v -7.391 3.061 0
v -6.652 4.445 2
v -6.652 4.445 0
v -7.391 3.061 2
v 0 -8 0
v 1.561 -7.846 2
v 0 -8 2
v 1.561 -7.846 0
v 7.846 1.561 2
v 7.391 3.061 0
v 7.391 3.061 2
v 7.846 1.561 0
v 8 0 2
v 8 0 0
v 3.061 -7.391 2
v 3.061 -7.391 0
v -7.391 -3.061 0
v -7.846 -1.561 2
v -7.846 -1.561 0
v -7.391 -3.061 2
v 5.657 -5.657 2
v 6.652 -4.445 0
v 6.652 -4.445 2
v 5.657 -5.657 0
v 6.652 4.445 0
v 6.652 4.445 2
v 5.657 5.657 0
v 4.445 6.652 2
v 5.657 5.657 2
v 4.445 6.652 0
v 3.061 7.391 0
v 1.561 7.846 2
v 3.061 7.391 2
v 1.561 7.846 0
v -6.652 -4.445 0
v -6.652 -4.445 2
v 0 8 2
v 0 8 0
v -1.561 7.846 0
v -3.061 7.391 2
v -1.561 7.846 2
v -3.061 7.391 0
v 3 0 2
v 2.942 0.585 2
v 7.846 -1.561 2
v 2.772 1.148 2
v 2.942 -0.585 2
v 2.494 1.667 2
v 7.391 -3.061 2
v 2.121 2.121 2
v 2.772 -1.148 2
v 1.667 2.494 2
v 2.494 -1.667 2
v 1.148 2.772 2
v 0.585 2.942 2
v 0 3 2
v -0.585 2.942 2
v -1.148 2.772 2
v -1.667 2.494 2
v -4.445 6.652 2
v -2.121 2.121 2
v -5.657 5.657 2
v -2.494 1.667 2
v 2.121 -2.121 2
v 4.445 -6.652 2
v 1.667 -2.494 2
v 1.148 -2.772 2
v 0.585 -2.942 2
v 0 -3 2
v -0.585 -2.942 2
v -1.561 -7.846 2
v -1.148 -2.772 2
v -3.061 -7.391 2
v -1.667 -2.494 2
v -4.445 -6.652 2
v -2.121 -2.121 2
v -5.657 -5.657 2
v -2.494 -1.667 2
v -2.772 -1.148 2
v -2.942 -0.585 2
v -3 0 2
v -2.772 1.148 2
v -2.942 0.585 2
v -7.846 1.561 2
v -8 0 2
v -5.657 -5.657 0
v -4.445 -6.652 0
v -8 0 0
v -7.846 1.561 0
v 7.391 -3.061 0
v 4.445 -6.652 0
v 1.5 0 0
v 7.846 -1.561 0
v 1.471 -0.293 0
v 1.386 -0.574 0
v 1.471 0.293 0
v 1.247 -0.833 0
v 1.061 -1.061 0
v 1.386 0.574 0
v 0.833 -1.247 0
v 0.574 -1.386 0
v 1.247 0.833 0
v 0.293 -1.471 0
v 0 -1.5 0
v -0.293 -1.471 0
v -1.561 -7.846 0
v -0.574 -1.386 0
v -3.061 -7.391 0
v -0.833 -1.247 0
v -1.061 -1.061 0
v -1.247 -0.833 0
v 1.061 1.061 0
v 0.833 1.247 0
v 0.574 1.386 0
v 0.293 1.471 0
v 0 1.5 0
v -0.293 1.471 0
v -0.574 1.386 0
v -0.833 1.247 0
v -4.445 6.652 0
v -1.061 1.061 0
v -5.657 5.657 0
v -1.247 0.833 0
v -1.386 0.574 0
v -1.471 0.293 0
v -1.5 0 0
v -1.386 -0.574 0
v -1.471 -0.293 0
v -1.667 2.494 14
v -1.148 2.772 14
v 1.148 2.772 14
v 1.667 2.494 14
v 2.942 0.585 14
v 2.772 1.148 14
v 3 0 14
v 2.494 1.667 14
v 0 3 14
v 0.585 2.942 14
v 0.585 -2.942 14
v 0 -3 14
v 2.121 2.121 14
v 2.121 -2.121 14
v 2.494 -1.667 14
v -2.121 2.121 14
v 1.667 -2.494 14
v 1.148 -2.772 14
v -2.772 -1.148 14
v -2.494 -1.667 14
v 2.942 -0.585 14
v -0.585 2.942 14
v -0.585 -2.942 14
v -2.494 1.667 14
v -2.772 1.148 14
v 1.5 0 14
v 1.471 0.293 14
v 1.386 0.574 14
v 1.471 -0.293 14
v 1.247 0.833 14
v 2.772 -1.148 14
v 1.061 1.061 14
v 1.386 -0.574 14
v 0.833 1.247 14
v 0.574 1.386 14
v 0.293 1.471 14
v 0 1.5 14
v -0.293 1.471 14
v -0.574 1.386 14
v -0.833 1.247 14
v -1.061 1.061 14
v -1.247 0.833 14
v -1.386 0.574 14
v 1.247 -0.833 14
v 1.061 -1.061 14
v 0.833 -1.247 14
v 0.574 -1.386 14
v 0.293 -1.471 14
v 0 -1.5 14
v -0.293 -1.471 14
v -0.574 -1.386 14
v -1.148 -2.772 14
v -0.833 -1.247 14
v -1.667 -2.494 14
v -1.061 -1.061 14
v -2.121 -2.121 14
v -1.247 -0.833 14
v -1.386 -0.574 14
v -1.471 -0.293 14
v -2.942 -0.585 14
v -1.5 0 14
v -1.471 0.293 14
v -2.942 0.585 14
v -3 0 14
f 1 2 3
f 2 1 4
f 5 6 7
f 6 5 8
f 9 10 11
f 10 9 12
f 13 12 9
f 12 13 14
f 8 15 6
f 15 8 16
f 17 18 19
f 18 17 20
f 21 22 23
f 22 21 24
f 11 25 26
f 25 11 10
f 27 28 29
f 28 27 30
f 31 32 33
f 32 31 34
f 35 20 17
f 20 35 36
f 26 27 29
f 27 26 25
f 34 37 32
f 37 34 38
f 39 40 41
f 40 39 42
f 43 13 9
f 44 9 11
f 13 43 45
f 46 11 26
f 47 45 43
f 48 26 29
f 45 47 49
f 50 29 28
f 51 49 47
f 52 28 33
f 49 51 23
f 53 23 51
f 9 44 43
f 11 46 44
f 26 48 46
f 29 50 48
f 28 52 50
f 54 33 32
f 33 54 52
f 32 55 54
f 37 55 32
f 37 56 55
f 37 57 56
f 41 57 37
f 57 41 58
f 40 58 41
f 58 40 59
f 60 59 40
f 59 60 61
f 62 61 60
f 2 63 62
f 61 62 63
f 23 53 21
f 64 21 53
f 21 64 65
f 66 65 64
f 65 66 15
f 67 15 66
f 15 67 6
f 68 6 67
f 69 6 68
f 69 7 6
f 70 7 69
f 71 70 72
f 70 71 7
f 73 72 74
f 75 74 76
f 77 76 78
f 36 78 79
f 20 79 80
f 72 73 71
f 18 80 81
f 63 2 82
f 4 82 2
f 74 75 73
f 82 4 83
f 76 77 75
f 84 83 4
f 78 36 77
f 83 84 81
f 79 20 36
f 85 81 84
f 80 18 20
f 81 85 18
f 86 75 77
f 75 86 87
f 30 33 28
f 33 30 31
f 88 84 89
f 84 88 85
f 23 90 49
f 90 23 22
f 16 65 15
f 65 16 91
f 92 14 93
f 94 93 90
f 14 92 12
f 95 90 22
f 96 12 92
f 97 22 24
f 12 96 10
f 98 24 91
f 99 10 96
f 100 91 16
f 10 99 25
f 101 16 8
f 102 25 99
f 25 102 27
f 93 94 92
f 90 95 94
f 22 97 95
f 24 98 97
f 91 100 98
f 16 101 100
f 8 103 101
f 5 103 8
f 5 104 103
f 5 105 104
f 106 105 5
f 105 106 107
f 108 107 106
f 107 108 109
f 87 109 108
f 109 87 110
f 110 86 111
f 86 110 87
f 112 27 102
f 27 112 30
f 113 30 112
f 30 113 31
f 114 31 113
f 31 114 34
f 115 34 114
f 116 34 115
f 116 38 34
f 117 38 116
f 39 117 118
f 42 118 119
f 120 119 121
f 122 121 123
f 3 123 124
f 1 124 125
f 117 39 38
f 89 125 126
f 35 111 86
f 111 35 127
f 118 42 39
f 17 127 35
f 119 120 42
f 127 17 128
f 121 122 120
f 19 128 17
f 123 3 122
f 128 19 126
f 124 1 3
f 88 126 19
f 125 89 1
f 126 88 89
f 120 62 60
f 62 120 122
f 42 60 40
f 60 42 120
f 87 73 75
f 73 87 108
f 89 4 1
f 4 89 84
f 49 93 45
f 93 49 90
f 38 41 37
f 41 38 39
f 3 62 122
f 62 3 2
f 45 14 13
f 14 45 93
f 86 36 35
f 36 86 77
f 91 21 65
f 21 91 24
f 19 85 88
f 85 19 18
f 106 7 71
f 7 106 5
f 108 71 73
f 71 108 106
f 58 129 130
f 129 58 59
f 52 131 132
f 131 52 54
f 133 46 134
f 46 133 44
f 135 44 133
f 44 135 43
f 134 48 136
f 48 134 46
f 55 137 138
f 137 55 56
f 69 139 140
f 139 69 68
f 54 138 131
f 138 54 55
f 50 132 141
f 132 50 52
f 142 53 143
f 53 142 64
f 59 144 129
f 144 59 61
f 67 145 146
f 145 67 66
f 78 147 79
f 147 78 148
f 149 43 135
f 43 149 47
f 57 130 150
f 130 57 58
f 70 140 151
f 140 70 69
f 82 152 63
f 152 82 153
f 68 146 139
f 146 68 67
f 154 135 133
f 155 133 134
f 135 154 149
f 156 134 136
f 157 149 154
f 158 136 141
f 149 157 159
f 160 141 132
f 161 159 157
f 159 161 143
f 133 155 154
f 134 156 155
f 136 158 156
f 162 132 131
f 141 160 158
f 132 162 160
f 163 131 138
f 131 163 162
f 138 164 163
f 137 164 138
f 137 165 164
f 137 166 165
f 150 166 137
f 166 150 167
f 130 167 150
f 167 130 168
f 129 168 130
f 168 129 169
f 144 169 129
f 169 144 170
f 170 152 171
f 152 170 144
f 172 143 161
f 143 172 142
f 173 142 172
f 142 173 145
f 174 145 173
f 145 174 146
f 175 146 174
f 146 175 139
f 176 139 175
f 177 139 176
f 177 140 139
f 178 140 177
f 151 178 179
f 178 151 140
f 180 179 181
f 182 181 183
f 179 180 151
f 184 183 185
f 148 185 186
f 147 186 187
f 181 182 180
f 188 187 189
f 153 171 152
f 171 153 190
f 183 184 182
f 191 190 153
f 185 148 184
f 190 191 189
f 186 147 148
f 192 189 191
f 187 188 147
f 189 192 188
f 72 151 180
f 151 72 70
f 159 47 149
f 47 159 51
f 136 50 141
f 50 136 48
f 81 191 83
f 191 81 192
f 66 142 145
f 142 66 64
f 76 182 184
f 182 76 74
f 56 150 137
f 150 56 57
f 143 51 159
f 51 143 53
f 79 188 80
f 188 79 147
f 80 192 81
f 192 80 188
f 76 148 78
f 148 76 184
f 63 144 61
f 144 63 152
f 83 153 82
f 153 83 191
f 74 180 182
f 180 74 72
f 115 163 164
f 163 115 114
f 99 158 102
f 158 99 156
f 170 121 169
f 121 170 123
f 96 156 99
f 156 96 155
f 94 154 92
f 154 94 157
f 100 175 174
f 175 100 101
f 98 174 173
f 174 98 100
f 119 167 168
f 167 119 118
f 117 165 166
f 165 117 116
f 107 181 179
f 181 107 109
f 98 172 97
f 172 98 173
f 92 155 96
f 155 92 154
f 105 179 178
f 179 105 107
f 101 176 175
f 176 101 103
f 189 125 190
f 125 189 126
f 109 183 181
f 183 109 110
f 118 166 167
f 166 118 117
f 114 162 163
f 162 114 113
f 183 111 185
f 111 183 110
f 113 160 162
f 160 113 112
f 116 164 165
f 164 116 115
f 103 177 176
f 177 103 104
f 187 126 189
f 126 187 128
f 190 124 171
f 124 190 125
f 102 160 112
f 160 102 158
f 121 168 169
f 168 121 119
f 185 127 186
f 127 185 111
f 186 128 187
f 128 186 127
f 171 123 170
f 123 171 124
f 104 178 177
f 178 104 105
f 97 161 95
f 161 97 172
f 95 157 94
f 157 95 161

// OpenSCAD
$fn = 32;

// ----------------------------------------------------------------------
// Micro post: flanged post, 5-20 mm class
// ----------------------------------------------------------------------

// --- parameters (mm) ---
post_d = 6;               // post diameter
post_h = 12;              // post height above the flange
flange_d = 16;            // flange diameter
flange_t = 2;             // flange thickness
bore_d = 3;               // through bore

total_h = post_h + flange_t;  // overall height

difference() {
  union() {
    cylinder(h = flange_t, d = flange_d);
    translate([0, 0, flange_t]) cylinder(h = post_h, d = post_d);
  }
  translate([0, 0, -1]) cylinder(h = total_h + 2, d = bore_d);
}
